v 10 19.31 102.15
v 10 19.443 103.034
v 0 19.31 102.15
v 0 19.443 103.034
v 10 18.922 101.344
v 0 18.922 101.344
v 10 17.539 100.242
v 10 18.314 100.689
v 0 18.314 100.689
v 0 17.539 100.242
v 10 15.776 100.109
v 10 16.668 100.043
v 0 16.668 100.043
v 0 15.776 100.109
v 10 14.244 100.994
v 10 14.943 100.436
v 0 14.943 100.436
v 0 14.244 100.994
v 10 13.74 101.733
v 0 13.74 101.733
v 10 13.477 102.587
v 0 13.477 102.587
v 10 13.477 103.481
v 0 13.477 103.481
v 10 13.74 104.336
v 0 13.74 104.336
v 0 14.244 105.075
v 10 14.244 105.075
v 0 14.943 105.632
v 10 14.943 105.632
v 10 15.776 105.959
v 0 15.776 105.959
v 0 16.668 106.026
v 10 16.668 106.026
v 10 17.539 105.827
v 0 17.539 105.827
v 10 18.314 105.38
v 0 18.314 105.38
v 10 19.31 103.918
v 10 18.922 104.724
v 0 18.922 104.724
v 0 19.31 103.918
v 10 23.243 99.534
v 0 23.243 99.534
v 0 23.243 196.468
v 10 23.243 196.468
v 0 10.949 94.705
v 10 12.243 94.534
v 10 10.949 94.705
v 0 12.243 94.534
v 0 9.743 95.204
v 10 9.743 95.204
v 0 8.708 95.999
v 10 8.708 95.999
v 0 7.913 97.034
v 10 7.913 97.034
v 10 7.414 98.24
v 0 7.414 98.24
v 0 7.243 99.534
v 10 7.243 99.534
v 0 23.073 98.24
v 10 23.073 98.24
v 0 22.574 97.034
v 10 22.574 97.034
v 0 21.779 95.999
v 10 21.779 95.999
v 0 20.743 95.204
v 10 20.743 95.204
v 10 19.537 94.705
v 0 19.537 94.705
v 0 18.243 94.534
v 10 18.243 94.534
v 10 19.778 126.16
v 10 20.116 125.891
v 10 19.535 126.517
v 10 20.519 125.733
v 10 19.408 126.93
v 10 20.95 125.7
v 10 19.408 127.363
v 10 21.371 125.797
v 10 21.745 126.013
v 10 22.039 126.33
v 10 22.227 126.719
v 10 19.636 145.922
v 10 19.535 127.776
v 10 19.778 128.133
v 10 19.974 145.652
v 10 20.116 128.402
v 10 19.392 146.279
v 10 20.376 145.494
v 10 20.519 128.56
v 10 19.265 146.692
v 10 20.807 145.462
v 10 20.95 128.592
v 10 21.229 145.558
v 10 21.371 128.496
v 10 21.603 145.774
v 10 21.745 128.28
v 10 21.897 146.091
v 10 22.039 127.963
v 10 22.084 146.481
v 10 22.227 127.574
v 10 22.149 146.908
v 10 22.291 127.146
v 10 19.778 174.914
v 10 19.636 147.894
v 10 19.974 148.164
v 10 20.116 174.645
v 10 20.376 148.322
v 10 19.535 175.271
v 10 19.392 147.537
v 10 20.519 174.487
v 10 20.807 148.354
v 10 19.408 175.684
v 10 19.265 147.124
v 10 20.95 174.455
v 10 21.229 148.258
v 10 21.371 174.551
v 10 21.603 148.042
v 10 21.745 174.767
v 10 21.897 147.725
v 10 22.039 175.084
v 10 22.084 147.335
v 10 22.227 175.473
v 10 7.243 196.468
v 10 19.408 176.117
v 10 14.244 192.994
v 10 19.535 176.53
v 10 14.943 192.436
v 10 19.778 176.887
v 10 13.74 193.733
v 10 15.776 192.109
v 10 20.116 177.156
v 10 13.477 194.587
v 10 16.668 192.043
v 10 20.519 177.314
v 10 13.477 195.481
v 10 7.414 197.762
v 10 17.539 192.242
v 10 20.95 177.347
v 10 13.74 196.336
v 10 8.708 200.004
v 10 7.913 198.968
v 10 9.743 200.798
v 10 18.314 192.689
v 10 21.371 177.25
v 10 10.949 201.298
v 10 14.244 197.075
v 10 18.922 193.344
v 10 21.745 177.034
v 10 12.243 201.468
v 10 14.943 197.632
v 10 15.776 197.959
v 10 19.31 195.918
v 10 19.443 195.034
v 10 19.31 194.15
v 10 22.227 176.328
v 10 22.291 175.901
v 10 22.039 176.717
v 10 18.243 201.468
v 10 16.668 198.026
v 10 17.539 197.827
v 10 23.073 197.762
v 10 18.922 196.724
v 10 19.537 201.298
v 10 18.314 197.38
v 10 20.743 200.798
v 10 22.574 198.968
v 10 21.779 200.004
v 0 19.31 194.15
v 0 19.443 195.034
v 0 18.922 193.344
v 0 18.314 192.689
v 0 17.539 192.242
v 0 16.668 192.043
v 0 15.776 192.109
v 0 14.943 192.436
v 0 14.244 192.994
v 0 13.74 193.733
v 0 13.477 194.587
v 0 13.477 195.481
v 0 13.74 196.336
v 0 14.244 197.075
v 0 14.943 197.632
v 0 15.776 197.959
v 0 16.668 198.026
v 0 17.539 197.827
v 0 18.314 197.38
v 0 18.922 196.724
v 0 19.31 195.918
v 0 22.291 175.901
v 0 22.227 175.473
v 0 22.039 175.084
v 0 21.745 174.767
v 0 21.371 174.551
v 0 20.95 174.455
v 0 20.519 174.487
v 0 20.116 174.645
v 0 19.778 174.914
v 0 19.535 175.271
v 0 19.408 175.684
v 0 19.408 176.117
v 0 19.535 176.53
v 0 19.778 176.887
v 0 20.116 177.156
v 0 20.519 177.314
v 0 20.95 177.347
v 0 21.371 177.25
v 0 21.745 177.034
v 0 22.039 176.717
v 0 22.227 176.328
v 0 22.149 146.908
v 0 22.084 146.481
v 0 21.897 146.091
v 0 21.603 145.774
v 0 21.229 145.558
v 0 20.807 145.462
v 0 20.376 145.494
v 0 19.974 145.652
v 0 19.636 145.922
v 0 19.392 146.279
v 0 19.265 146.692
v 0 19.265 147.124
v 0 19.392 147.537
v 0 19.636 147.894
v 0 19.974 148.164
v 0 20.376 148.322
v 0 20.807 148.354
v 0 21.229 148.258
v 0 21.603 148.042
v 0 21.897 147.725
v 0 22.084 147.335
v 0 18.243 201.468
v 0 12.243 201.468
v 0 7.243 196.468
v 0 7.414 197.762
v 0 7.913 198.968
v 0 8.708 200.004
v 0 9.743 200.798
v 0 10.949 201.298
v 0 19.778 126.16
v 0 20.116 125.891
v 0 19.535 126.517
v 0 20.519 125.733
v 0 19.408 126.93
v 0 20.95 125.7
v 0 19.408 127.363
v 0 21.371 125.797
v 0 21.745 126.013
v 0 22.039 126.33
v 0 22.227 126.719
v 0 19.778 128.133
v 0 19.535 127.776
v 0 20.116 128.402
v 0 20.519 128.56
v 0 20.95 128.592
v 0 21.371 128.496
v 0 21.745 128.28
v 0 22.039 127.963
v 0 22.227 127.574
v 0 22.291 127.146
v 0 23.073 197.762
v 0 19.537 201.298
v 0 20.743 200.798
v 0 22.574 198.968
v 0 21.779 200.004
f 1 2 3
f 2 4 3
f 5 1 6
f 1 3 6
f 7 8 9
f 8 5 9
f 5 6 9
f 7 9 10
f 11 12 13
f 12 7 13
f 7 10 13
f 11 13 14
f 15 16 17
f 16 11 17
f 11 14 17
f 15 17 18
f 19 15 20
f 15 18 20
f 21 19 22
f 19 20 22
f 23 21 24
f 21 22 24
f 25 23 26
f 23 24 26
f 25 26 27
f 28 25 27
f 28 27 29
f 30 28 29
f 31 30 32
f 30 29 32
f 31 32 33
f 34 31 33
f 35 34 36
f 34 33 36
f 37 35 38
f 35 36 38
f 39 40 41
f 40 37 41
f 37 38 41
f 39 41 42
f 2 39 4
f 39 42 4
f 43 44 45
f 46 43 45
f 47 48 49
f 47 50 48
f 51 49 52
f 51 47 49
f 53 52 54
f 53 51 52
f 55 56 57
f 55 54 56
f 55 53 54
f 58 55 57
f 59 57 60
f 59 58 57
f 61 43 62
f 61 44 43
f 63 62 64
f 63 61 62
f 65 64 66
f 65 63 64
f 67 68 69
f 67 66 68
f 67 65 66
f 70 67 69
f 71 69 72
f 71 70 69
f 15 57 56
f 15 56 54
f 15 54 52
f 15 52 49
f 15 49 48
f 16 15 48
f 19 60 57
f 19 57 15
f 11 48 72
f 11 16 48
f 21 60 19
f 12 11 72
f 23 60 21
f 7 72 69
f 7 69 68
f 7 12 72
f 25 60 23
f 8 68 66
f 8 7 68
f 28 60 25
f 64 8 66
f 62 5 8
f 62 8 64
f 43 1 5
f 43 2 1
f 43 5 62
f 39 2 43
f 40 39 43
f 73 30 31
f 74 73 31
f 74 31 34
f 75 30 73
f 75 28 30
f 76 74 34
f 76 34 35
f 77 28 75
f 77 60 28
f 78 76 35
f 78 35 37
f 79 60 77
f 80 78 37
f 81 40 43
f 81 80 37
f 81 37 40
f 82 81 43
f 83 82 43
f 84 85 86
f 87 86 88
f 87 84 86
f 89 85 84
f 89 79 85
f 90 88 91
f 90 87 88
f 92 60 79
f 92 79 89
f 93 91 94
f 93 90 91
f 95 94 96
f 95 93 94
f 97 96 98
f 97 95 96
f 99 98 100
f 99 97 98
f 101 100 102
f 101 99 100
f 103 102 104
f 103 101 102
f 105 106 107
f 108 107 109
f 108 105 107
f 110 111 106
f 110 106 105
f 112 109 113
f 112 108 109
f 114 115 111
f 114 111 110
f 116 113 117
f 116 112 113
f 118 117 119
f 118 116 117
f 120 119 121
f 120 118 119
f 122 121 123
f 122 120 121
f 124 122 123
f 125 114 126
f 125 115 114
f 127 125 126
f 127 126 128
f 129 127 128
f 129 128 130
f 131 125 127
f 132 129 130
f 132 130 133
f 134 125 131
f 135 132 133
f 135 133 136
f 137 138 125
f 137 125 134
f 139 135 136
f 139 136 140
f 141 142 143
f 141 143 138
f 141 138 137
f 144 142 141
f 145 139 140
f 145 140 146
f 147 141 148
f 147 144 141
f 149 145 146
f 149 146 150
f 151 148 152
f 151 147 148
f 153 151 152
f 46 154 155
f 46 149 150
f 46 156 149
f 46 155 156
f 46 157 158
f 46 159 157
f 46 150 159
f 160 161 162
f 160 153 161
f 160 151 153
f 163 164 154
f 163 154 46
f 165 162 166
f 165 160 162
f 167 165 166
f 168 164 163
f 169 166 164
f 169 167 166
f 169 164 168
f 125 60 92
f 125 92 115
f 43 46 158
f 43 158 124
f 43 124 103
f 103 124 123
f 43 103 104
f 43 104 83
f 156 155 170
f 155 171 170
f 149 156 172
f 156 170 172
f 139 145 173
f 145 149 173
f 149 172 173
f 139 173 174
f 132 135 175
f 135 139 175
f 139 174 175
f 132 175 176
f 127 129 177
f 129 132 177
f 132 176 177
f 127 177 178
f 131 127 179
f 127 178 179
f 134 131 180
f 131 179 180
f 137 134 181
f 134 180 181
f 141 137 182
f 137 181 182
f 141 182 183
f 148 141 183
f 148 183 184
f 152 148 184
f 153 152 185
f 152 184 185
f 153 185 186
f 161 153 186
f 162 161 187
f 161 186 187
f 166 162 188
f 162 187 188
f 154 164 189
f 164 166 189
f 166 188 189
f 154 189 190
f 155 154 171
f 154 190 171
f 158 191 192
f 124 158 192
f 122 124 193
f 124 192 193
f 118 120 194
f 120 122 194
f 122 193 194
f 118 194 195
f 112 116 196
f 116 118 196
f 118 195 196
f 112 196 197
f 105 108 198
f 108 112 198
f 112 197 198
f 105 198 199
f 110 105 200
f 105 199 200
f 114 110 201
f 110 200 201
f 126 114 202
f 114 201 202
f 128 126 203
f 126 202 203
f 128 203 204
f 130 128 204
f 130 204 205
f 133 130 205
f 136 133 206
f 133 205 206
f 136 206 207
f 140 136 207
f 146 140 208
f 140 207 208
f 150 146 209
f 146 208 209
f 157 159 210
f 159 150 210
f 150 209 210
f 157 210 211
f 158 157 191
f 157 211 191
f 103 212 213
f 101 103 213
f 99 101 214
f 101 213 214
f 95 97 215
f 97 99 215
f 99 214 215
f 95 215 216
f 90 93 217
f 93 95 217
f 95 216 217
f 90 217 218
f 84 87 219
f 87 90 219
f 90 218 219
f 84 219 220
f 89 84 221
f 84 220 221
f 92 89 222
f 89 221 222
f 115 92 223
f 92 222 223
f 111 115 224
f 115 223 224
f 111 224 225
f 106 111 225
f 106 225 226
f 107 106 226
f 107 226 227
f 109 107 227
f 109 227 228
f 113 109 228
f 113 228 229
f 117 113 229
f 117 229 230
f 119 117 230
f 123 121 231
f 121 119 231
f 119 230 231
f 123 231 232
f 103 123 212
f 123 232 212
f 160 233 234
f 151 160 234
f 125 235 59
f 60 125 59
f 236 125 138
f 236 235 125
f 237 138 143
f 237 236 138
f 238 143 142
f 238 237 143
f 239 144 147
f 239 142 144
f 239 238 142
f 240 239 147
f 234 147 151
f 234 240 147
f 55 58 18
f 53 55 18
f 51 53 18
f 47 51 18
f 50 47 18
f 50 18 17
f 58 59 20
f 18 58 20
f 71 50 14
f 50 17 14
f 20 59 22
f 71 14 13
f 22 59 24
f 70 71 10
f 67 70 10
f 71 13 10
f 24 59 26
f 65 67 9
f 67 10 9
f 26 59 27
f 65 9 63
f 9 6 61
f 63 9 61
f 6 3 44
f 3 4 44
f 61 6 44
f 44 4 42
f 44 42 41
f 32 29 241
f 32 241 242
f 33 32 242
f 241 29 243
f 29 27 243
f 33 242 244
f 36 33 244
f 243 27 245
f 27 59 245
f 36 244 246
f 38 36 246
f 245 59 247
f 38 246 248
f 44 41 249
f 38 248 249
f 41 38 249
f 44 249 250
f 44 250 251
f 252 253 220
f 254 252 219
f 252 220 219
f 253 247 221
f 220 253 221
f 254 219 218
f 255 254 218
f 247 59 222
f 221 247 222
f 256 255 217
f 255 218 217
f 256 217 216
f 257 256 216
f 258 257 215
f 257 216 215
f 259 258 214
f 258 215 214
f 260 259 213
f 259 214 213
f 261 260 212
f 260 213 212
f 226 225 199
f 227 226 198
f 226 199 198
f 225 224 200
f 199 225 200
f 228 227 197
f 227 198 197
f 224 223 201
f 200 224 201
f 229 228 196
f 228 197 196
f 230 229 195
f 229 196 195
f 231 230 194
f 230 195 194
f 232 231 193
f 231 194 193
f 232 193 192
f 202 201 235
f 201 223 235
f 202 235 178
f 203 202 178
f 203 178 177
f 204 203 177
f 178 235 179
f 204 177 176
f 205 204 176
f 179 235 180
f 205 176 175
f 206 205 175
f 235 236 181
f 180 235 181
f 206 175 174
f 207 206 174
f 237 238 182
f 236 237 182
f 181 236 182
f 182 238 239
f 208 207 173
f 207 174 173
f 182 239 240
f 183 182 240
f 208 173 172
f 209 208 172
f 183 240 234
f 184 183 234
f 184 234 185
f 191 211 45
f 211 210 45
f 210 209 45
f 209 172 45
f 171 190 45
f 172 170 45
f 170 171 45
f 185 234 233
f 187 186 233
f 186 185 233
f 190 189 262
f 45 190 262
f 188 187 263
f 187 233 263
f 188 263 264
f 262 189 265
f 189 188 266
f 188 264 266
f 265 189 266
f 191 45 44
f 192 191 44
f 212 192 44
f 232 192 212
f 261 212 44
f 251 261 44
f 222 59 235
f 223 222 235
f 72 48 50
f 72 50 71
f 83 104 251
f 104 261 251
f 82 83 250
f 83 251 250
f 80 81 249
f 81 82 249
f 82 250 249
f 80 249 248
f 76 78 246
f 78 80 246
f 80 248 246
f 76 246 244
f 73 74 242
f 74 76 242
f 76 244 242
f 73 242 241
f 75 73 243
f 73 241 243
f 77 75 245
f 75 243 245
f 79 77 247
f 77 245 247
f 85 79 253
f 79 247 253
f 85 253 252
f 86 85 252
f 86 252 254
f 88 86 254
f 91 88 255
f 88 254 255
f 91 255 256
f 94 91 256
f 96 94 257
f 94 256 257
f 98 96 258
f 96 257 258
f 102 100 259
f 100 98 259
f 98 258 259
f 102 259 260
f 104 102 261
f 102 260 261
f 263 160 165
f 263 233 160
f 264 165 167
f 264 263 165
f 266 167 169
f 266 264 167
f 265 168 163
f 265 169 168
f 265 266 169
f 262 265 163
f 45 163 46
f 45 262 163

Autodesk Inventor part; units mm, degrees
ref_plane "YZ Plane" through (0, 0, 0) normal (1, 0, 0) x (0, 1, 0)
ref_plane "XZ Plane" through (0, 0, 0) normal (0, 1, 0) x (-1, 0, 0)
ref_plane "XY Plane" through (0, 0, 0) normal (0, 0, 1) x (1, 0, 0)
sketch "Sketch1" plane through (0, 0.6434, 0) normal (1, 0, 0) x (0, 1, 0)
  circle A0 centre (15.8, 195.0342) radius 3 construction
  circle A1 centre (15.8, 103.0342) radius 3 construction
  circle A2 centre (20.0554, 146.9079) radius 1.45 construction
  circle A3 centre (-24.7132, 132.4283) radius 3.5 construction
  circle A4 centre (-24.9297, 123.6553) radius 3.5 construction
  circle A5 centre (15.1664, 127.0554) radius 4 construction
  circle A6 centre (-25.4429, 102.8495) radius 4 construction
  circle A7 centre (-24.2, 153.2342) radius 4 construction
  circle A8 centre (14.5499, 102.063) radius 2.95 construction
  circle A9 centre (16.8187, 194.035) radius 2.95 construction
  line L0 (-1.4549, 93.9552) -> (-1.2206, 103.4531) construction
  line L1 (-1.4549, 93.9552) -> (16.1397, 93.5212) construction
  arc A10 (16.1397, 93.5212) -> (21.2615, 98.3964) centre (16.263, 98.5197) ccw construction
  line L2 (21.2615, 98.3964) -> (23.652, 195.301) construction
  arc A11 (23.652, 195.301) -> (18.7768, 200.4228) centre (18.6535, 195.4243) ccw construction
  line L3 (18.7768, 200.4228) -> (12.8677, 200.5685) construction
  arc A12 (12.8677, 200.5685) -> (8.4173, 198.0753) centre (12.7444, 195.57) ccw construction
  line L4 (8.4173, 198.0753) -> (0.9275, 185.1387) construction
  line L5 (0.1833, 154.9709) -> (0.9275, 185.1387) construction
  line L6 (-7.9473, 155.1714) -> (0.1833, 154.9709) construction
  line L7 (-7.8733, 158.1705) -> (-7.9473, 155.1714) construction
  line L8 (-2.3058, 158.0332) -> (-7.8733, 158.1705) construction
  line L9 (-1.7513, 180.5119) -> (-2.3058, 158.0332) construction
  line L10 (-1.7513, 180.5119) -> (-12.8987, 161.2579) construction
  line L11 (-29.7936, 161.6747) -> (-12.8987, 161.2579) construction
  arc A13 (-29.7936, 161.6747) -> (-31.8423, 159.7246) centre (-29.8429, 159.6753) ccw construction
  line L12 (-31.8423, 159.7246) -> (-33.3959, 96.7438) construction
  arc A14 (-33.3959, 96.7438) -> (-31.4458, 94.695) centre (-31.3965, 96.6944) ccw construction
  line L13 (-31.4458, 94.695) -> (-3.885, 94.0152) construction
  line L14 (-3.7247, 100.514) -> (-3.885, 94.0152) construction
  line L15 (-9.2922, 100.6513) -> (-3.7247, 100.514) construction
  line L16 (-9.2182, 103.6504) -> (-9.2922, 100.6513) construction
  line L17 (-1.2206, 103.4531) -> (-9.2182, 103.6504) construction
  circle A15 centre (14.1273, 157.9245) radius 4.7908 construction
  line L18 (17.6, 201.4682) -> (11.6, 201.4682)
  line L19 (6.6, 196.4682) -> (6.6, 99.5342)
  line L20 (11.6, 94.5342) -> (17.6, 94.5342)
  line L21 (22.6, 99.5342) -> (22.6, 196.4682)
  arc A16 (11.6, 201.4682) -> (6.6, 196.4682) centre (11.6, 196.4682) ccw
  arc A17 (22.6, 196.4682) -> (17.6, 201.4682) centre (17.6, 196.4682) ccw
  arc A18 (17.6, 94.5342) -> (22.6, 99.5342) centre (17.6, 99.5342) ccw
  arc A19 (6.6, 99.5342) -> (11.6, 94.5342) centre (11.6, 99.5342) ccw
  circle A20 centre (20.0554, 146.9079) radius 1.45 projected
  circle A21 centre (15.8, 103.0342) radius 3 projected
  circle A22 centre (15.8, 195.0342) radius 3 projected
  circle A23 centre (20.198, 175.9006) radius 1.45
  circle A24 centre (20.198, 127.1464) radius 1.45
  point P0 (-0.6434, 0)
  point P1 (6.6, 94.5342)
  dimension "d0" = 16
  dimension "d1" = 5
  dimension "d2" = 2.9
  dimension "d3" = 2.9
extrude "Extrusion1" add sketch "Sketch1" along normal blind 10
properties part number "Neje_Base_Slide_y_stop"
